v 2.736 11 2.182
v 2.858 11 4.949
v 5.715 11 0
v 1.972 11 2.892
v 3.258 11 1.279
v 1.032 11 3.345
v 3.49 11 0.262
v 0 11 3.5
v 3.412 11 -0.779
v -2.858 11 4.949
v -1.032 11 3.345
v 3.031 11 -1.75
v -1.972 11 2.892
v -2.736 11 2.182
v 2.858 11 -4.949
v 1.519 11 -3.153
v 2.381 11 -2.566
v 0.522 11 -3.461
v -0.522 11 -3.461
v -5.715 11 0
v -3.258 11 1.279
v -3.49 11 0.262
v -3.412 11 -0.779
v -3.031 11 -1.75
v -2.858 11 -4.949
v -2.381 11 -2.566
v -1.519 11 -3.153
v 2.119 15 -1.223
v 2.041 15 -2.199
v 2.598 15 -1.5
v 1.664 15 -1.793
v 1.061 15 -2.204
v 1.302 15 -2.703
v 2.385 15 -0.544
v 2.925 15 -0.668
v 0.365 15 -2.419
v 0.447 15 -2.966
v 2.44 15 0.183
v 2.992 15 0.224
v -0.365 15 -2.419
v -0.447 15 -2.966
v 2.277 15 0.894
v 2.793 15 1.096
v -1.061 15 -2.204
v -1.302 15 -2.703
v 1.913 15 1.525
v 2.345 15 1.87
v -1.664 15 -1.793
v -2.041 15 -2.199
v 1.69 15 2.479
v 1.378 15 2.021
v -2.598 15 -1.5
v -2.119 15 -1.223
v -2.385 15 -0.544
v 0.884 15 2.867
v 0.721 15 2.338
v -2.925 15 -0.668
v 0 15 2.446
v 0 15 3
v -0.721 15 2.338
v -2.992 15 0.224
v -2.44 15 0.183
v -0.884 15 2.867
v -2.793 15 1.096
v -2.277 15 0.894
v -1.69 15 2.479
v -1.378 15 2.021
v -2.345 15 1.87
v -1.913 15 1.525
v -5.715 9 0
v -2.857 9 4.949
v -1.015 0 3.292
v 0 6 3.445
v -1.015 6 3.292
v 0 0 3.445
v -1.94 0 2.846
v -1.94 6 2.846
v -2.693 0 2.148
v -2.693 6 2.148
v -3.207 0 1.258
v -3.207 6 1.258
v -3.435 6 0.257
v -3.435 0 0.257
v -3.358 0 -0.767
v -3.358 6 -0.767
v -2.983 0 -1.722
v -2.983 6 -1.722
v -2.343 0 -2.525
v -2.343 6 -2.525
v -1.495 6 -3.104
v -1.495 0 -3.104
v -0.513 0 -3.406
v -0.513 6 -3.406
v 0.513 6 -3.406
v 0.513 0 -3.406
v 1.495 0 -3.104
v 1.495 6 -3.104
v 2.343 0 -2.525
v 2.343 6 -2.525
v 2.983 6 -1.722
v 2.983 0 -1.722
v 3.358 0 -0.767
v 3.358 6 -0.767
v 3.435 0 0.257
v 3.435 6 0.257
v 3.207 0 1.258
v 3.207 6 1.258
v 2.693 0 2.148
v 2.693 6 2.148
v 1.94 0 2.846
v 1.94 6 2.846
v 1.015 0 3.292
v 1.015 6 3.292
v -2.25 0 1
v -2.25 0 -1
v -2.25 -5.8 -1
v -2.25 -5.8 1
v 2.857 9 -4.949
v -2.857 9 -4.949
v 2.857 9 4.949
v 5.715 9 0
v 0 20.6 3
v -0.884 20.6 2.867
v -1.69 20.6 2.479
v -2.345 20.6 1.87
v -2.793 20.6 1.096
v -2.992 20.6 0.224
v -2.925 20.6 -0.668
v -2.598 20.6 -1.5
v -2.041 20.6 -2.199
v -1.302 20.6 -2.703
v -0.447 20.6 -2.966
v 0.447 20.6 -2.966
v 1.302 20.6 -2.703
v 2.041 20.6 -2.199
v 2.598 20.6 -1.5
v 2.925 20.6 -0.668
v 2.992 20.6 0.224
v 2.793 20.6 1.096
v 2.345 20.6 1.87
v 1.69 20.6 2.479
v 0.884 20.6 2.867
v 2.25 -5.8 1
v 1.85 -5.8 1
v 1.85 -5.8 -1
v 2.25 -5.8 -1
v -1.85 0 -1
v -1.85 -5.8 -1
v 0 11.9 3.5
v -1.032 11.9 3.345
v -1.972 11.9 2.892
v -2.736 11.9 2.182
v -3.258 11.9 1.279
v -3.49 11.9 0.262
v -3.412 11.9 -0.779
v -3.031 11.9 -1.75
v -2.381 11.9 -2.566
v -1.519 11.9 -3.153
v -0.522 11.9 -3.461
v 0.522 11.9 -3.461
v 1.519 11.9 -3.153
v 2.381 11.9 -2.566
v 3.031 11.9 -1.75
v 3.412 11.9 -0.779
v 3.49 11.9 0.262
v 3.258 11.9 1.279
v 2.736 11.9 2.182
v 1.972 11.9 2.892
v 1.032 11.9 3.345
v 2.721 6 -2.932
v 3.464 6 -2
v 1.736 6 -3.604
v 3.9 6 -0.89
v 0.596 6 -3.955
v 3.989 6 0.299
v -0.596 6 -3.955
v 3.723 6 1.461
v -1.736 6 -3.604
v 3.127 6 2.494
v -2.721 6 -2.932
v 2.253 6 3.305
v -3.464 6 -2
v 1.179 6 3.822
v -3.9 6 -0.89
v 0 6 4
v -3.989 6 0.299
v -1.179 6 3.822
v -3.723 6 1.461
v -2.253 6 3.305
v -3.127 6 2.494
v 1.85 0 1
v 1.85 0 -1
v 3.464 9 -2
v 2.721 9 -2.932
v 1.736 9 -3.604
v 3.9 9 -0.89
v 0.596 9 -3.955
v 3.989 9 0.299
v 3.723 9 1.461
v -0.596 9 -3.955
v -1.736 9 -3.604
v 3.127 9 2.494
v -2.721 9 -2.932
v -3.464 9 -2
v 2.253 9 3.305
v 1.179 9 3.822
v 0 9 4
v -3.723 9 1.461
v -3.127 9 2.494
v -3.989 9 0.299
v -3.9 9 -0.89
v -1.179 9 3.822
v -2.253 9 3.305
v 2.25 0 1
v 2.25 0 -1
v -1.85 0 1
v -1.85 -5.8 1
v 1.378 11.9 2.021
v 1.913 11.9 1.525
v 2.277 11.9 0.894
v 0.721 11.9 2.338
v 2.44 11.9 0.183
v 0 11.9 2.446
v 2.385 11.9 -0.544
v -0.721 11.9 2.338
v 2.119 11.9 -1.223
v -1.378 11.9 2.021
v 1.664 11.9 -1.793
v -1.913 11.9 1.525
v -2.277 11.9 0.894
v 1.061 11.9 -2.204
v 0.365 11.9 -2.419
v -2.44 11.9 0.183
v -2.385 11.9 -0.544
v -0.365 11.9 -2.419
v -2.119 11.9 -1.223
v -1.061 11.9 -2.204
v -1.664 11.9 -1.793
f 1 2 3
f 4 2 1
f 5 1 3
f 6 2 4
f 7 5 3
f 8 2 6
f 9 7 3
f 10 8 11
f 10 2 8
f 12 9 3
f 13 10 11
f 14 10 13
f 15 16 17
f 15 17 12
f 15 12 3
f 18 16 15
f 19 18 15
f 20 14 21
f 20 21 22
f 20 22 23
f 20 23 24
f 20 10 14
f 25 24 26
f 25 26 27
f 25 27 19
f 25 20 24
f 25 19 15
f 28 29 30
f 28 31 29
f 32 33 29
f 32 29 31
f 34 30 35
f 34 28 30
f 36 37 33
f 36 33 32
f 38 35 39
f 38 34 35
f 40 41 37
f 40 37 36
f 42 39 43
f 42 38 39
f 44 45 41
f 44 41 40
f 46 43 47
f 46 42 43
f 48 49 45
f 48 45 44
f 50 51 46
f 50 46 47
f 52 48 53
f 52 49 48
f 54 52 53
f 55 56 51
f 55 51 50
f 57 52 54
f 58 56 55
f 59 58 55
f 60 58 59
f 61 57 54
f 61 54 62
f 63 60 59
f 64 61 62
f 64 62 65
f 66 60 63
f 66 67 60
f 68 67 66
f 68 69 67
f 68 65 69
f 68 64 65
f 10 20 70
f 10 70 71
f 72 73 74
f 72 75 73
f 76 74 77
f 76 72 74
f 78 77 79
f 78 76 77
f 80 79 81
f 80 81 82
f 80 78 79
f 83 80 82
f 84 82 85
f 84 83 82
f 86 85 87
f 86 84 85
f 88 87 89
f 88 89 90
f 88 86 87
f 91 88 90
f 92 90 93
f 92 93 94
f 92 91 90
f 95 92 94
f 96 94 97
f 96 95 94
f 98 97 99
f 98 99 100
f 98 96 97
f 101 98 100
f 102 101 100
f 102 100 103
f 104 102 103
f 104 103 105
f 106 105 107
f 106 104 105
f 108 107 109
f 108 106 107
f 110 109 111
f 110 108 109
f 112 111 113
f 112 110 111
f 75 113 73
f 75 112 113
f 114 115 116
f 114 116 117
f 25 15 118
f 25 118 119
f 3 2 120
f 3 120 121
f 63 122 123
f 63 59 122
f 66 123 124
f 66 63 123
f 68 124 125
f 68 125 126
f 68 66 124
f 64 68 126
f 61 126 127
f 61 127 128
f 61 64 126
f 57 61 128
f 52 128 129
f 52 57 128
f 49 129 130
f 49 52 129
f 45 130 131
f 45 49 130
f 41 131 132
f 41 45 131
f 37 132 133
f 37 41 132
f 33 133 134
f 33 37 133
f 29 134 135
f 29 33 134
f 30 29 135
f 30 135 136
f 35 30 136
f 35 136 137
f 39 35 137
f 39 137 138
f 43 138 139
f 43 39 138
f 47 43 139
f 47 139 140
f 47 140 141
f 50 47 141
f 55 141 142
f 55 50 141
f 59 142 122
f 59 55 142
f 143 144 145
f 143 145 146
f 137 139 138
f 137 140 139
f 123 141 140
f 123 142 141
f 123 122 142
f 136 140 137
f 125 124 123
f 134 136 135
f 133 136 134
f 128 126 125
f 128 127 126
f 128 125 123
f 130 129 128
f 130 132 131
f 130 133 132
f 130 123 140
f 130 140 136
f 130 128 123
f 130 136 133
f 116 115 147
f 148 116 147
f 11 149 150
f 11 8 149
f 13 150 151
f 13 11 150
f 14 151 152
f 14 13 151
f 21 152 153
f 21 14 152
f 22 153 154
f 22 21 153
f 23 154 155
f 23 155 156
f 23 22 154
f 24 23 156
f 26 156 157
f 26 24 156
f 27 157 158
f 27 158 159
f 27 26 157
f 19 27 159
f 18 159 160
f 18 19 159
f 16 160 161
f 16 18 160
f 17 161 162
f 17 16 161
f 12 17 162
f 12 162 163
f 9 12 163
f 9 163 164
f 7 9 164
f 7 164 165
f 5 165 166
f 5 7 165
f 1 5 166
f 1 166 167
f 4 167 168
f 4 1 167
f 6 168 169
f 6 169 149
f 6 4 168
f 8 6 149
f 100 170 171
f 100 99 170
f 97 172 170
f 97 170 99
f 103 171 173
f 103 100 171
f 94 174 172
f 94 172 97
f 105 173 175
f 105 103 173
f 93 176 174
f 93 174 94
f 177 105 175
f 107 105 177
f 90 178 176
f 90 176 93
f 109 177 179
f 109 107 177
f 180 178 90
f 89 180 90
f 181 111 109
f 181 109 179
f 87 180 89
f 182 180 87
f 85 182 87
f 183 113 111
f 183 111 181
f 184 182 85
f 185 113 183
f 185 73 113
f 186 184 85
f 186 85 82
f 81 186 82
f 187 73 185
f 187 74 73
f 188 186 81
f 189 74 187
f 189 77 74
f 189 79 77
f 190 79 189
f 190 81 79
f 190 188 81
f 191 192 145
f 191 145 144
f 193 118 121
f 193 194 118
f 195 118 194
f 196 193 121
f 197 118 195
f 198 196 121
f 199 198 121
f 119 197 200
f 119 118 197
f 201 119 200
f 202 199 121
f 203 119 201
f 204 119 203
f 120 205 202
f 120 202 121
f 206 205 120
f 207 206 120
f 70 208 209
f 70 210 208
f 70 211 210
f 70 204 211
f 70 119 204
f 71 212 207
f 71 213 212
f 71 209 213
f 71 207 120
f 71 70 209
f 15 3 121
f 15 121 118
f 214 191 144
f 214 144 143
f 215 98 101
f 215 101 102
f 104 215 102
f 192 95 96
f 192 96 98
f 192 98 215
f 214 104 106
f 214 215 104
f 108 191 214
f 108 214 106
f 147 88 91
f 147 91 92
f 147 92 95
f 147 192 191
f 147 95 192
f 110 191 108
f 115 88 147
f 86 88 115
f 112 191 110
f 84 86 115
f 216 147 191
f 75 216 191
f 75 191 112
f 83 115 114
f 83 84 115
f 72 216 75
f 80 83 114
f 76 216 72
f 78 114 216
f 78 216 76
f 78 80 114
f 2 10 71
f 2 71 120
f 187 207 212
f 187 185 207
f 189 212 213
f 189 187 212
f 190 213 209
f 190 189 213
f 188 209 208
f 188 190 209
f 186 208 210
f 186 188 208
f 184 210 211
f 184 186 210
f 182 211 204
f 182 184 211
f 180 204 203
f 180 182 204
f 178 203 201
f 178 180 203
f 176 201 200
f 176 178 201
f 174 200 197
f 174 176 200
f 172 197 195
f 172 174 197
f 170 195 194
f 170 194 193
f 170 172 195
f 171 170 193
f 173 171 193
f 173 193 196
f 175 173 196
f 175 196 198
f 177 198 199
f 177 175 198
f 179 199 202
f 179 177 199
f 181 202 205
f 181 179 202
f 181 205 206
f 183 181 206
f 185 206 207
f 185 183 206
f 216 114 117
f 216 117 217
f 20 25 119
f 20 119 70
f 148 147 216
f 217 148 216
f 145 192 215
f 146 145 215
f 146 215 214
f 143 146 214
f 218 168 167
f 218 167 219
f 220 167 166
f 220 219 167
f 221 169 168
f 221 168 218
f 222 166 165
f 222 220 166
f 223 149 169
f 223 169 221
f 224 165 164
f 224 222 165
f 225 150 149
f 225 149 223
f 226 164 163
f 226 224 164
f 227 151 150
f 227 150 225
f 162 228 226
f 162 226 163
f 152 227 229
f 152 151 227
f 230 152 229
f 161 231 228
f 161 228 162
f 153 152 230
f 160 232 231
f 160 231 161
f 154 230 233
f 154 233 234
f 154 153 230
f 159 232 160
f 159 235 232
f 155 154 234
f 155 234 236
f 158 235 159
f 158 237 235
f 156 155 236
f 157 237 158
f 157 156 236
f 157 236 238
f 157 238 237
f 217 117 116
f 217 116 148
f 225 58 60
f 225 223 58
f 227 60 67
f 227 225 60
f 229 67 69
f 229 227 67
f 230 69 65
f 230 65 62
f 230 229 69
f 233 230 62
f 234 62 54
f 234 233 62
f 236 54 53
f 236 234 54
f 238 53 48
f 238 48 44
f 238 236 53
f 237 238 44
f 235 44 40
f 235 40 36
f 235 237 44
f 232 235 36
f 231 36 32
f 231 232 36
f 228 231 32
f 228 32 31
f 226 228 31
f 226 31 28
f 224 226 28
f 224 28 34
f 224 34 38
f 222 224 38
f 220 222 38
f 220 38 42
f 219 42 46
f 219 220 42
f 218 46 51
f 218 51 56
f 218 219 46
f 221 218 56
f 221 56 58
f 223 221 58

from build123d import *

# Parameters (mm, degrees)
SKETCH2_R           = 6.57086473
CUT_EXTRUDE3_DEPTH  = 5
SKETCH3_W           = 0.4
SKETCH3_H           = 2
BOSS_EXTRUDE2_DEPTH = 5.8


with BuildPart() as part:
    # Sketch1 → Revolve2 (revolve)
    with BuildSketch(Plane.XY, mode=Mode.PRIVATE) as revolve2_sk:
        Polygon((0, 20.6), (3, 20.6), (3, 15), (2.446439684, 15), (2.446439684, 11.9), (3.5, 11.9), (3.5, 11), (5.715, 11), (5.715, 9), (4, 9), (4, 6), (3.444705053, 6), (3.444705053, 0), (0, 0), align=None)
    revolve(revolve2_sk.sketch.rotate(Axis((0, 22.726966954, 0), (0, -1, 0)), 90), axis=Axis((0, 22.726966954, 0), (0, -1, 0)))

    # Sketch2 → Cut-Extrude3 (cut)
    with BuildSketch(Plane(origin=(0, 11, 0), x_dir=(1, 0, 0), z_dir=(0, 1, 0))):
        Circle(SKETCH2_R)
        Polygon((5.715, 0), (2.8575, 4.949335183), (-2.8575, 4.949335183), (-5.715, 0), (-2.8575, -4.949335183), (2.8575, -4.949335183), align=None, mode=Mode.SUBTRACT)
    extrude(amount=-CUT_EXTRUDE3_DEPTH, mode=Mode.SUBTRACT)

    # Sketch3 → Boss-Extrude2 (add)
    with BuildSketch(Plane.XZ):
        with Locations((-2.05, 0)):
            Rectangle(SKETCH3_W, SKETCH3_H)
        with Locations((2.05, 0)):
            Rectangle(SKETCH3_W, SKETCH3_H)
    extrude(amount=BOSS_EXTRUDE2_DEPTH)


solid = part.part
